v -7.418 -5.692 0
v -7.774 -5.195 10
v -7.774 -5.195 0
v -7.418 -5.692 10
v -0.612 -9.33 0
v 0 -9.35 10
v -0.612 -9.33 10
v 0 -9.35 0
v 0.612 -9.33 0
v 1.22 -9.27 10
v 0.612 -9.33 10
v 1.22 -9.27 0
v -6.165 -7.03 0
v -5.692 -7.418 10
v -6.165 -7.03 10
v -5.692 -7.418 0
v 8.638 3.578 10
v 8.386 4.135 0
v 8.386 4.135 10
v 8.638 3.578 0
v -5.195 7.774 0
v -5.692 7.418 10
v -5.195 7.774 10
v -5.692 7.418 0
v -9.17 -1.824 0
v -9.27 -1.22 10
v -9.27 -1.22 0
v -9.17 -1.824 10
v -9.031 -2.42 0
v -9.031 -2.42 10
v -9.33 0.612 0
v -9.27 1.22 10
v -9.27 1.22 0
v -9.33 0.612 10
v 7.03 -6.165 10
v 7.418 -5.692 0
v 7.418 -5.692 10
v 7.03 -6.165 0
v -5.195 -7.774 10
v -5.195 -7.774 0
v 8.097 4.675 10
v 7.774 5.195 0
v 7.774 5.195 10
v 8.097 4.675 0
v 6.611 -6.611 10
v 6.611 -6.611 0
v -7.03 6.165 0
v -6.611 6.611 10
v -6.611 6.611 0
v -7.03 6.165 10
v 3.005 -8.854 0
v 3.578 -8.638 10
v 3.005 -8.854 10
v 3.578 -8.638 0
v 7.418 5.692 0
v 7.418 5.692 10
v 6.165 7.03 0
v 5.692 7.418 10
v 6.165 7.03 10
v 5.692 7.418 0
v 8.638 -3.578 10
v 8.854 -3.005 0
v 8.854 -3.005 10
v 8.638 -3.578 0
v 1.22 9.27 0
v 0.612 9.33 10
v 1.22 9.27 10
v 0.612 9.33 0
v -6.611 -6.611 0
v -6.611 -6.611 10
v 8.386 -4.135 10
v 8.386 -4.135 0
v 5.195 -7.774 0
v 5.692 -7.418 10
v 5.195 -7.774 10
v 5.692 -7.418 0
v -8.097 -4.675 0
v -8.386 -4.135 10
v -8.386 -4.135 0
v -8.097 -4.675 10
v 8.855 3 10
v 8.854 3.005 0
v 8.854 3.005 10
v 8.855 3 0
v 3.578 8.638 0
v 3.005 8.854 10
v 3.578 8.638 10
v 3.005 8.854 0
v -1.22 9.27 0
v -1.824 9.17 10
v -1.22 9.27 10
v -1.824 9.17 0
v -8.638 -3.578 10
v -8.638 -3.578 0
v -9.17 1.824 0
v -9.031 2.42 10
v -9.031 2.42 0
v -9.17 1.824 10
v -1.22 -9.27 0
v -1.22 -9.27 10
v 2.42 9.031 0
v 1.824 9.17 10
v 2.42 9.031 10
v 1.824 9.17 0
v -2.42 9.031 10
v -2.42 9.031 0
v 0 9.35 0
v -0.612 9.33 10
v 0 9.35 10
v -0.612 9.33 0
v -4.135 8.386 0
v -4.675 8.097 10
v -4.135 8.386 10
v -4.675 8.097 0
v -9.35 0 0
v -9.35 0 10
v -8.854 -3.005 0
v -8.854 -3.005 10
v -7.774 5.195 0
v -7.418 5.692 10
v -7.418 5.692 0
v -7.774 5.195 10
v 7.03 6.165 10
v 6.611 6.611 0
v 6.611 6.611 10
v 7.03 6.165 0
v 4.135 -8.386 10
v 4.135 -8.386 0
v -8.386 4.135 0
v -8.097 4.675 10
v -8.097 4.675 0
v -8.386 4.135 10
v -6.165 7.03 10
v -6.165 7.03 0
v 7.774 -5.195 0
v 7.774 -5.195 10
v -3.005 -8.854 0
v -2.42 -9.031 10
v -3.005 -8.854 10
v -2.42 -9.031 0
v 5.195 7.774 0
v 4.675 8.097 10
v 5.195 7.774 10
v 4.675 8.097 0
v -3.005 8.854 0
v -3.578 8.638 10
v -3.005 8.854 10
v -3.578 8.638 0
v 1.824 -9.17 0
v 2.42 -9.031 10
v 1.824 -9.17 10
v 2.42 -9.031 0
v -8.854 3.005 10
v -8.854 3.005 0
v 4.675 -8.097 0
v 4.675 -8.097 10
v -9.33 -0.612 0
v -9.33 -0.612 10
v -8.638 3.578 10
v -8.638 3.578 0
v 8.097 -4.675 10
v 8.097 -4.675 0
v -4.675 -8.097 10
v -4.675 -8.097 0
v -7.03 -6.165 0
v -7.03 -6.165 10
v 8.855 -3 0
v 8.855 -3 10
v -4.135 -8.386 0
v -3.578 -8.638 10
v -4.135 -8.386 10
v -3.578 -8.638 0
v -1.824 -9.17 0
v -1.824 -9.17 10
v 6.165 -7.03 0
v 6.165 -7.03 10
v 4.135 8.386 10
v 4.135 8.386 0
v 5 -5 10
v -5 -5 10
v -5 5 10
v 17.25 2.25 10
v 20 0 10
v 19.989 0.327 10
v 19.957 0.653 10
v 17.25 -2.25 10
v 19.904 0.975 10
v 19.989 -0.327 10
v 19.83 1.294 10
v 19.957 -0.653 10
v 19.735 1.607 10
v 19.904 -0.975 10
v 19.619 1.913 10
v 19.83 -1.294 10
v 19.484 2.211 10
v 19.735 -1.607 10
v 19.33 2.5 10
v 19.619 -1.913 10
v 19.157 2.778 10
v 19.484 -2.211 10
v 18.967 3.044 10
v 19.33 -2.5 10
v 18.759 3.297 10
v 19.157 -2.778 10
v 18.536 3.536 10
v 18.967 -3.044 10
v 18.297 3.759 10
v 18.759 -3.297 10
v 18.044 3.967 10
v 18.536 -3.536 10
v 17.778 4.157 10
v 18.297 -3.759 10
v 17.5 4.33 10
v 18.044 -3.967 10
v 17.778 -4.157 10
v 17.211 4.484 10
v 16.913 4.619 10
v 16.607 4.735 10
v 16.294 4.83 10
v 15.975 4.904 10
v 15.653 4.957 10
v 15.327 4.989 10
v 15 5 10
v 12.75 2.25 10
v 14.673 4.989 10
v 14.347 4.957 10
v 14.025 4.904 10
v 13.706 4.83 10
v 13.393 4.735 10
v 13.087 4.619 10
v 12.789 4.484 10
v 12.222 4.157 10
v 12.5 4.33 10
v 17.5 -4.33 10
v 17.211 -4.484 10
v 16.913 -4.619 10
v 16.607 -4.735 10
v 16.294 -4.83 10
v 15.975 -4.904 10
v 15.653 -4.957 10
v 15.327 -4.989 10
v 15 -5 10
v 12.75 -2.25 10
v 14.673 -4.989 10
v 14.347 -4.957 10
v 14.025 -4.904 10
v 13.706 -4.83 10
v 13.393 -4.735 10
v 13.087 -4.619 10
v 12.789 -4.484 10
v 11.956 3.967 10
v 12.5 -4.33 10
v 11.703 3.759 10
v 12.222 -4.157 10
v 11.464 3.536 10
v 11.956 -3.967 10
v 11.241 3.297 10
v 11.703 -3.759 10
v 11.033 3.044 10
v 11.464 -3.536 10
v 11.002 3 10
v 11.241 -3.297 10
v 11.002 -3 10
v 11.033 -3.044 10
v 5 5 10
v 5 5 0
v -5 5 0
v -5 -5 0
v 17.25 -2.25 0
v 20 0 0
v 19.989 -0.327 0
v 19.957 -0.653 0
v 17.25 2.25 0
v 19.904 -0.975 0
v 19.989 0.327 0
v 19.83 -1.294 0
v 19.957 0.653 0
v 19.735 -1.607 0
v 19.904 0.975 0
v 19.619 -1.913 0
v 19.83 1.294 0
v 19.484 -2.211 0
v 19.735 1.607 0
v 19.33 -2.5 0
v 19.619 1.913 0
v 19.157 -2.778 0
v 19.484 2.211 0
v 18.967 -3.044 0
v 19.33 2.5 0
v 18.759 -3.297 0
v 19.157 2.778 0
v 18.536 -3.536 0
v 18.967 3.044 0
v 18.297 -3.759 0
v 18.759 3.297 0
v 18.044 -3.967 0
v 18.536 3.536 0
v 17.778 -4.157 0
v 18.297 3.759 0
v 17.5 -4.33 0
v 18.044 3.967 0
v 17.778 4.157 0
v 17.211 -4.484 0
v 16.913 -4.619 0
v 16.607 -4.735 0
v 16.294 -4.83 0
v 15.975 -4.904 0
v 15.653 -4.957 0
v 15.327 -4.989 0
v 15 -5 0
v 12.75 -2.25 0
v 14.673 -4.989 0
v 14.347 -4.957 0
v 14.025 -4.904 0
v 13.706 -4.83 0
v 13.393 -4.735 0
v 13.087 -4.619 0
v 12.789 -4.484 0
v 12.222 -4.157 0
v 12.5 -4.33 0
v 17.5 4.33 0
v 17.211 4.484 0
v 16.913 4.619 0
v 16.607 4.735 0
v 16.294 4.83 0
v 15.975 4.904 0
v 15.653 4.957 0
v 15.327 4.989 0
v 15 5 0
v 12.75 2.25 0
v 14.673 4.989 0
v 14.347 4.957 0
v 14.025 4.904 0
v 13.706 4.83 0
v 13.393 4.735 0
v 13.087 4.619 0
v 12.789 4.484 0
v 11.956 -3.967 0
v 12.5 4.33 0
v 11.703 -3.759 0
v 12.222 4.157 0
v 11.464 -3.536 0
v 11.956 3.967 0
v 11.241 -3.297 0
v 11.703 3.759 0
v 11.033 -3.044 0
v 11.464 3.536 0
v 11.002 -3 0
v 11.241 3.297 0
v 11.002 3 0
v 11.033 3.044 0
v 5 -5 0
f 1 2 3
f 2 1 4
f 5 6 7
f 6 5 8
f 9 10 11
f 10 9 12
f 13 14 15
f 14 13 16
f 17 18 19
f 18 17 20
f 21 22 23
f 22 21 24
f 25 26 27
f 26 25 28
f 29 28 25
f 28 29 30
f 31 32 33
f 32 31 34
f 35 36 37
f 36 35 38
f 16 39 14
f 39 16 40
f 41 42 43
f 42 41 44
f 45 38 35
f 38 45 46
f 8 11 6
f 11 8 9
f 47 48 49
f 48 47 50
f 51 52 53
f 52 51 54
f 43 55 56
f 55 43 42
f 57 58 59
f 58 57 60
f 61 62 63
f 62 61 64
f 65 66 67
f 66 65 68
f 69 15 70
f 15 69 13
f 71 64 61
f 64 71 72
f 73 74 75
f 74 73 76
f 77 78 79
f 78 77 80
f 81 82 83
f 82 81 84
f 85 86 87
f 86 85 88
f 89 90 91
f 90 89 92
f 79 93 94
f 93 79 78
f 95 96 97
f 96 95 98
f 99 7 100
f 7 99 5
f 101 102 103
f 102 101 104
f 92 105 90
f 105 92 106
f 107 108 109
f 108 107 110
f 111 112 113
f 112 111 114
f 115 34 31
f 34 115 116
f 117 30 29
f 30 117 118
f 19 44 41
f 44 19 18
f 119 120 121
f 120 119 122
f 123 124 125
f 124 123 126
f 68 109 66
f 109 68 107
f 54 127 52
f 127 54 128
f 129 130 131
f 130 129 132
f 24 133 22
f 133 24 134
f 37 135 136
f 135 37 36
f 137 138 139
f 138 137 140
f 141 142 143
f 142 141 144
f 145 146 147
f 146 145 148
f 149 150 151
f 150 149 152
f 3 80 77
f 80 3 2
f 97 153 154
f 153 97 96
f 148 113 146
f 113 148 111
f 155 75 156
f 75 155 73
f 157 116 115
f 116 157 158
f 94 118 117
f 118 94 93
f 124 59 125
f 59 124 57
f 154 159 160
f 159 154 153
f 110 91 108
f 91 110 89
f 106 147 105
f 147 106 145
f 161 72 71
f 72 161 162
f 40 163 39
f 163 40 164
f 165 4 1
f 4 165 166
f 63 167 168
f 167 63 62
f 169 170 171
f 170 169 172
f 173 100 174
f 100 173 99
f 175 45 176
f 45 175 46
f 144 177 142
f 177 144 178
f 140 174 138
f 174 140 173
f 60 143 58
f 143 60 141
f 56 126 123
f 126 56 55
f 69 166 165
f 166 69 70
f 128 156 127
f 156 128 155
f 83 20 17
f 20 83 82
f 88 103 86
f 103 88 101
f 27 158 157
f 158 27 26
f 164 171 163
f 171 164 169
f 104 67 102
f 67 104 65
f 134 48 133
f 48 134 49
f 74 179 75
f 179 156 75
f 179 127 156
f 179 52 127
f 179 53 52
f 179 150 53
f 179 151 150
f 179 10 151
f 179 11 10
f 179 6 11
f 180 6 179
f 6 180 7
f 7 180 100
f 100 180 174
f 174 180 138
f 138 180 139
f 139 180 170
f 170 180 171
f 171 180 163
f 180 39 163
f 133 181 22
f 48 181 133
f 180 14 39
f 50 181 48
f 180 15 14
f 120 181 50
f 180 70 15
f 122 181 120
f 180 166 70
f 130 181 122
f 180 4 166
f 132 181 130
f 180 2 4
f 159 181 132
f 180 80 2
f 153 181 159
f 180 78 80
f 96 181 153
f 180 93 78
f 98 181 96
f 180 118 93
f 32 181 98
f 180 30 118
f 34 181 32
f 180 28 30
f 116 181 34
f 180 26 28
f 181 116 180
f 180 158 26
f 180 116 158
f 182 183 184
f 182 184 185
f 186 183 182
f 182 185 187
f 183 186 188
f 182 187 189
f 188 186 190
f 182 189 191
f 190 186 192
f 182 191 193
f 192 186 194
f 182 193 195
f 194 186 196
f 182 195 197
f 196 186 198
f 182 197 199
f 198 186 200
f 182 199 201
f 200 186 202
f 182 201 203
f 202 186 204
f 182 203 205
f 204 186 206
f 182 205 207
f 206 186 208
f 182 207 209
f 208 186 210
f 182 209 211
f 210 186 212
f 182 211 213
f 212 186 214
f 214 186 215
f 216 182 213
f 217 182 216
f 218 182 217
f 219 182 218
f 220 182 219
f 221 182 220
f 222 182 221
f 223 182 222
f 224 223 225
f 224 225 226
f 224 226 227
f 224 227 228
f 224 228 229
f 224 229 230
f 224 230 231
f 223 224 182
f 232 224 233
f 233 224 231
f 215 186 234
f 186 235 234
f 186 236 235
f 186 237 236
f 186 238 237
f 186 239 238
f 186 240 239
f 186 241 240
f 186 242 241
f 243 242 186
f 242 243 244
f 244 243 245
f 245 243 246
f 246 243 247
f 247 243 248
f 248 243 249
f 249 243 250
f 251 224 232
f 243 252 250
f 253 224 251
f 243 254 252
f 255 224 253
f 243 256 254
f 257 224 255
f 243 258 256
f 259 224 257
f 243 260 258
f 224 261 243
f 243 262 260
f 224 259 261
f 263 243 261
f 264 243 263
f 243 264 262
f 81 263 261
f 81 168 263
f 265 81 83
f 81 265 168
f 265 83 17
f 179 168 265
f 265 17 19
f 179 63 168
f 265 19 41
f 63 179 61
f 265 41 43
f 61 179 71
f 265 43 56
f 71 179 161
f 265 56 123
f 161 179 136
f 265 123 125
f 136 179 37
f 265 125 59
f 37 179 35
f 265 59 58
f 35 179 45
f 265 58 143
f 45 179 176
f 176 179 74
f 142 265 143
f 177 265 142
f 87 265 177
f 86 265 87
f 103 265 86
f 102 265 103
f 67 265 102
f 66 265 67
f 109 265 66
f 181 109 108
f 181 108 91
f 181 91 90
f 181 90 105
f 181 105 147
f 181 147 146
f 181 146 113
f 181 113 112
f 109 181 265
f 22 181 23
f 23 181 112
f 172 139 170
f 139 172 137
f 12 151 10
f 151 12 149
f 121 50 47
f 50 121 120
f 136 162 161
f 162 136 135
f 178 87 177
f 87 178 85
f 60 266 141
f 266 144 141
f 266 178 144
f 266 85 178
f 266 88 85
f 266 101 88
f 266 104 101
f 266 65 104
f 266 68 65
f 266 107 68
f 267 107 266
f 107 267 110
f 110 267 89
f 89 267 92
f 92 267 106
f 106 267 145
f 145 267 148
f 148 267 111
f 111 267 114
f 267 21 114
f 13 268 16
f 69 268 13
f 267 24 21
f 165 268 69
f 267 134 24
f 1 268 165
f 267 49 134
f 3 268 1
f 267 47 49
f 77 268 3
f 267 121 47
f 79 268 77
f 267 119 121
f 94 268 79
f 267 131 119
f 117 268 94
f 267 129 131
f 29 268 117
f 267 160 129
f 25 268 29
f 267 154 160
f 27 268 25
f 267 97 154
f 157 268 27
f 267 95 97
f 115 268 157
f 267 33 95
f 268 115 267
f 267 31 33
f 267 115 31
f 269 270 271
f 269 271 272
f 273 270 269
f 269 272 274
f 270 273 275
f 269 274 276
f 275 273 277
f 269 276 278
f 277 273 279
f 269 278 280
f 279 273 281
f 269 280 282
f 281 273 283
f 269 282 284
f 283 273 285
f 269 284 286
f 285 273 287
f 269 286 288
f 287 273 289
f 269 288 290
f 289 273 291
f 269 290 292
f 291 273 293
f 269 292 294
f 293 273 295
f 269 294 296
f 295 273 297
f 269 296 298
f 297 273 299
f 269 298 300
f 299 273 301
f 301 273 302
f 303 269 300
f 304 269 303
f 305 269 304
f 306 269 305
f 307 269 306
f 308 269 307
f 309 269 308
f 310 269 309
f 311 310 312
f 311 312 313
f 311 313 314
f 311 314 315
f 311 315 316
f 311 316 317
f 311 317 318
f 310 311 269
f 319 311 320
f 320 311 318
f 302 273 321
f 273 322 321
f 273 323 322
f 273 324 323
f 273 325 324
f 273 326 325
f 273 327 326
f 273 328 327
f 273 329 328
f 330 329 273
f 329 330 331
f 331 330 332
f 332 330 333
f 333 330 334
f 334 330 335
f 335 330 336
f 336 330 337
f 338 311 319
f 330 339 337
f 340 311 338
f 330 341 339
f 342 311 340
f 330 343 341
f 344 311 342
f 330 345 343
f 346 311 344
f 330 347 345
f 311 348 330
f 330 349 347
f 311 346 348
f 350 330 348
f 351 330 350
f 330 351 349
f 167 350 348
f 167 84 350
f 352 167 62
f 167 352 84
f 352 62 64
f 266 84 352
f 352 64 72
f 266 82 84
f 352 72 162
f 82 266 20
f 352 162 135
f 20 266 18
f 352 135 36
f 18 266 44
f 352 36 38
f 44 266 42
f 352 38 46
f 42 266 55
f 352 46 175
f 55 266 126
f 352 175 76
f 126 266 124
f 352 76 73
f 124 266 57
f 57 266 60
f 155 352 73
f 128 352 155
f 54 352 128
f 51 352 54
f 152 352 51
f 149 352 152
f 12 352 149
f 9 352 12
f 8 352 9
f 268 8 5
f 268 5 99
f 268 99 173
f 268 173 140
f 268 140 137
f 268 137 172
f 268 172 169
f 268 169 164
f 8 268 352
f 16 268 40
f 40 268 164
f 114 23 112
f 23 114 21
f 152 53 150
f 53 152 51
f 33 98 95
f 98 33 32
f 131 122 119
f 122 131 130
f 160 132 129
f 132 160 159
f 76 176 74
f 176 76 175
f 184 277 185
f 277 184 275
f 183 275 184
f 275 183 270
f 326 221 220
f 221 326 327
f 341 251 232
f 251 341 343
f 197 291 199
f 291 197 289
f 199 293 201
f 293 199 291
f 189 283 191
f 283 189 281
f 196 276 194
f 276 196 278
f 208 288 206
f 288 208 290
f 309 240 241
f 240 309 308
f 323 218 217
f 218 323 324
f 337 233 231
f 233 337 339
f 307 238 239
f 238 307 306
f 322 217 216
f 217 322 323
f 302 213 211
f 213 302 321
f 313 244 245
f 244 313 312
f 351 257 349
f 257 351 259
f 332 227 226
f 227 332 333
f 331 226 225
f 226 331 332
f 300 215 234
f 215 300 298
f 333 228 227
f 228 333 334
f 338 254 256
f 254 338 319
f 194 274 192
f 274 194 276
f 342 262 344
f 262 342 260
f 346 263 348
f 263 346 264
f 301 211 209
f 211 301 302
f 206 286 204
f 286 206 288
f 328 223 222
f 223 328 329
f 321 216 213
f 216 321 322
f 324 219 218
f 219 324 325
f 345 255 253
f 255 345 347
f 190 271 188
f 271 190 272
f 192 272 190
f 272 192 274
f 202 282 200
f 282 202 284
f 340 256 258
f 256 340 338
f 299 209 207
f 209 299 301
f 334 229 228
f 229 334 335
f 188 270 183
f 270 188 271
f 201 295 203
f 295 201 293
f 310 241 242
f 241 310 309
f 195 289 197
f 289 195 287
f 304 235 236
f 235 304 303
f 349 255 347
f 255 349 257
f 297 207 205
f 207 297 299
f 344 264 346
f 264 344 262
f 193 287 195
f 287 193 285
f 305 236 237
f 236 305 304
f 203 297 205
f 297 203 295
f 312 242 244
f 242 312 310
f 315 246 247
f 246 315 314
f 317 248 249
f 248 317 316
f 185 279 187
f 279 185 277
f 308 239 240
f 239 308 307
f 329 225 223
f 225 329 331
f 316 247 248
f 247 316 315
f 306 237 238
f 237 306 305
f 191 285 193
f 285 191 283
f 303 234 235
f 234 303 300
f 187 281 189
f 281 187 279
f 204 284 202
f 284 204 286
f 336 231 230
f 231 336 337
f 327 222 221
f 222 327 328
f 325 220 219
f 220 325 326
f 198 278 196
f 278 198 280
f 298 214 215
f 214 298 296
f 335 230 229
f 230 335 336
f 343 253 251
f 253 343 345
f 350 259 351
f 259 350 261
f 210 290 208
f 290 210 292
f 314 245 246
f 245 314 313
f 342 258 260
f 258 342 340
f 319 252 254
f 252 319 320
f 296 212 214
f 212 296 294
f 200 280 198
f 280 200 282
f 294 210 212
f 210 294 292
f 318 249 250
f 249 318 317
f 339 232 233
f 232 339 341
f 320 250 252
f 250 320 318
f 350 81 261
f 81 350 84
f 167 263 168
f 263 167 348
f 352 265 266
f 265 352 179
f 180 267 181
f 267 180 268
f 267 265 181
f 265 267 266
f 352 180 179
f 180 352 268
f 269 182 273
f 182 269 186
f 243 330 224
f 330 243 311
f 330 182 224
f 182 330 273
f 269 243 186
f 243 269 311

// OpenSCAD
// Snap-on tubing clip for 12.7 mm lab stand rod
// Print orientation: flat on bed, extruded in +Z

// ---- Stand rod ring ----
stand_d      = 12.7;   // stand rod diameter
stand_wall   = 3;      // ring wall thickness
stand_od     = stand_d + 2 * stand_wall; // 18.7 mm outer diameter
stand_open   = 10;     // opening width on -X side

// ---- Tubing ring ----
tube_d       = 6;      // tubing inner diameter
tube_wall    = 2;      // ring wall thickness
tube_od      = tube_d + 2 * tube_wall;   // 10 mm outer diameter
tube_x       = 15;     // ring centre X
tube_open    = 4.5;    // opening width on +X side

// ---- Bridge ----
bridge_w     = 6;      // bridge width in Y
bridge_x0    = 8;      // bridge start X
bridge_x1    = 12;     // bridge end X

// ---- Misc ----
eps          = 0.5;    // cutter overshoot
$fn          = 96;

difference() {
    union() {
        // Stand rod ring
        translate([0, 0, 0])
            cylinder(d = stand_od, h = 10);
        // Tubing ring
        translate([tube_x, 0, 0])
            cylinder(d = tube_od, h = 10);
        // Bridge
        translate([bridge_x0, -bridge_w / 2, 0])
            cube([bridge_x1 - bridge_x0, bridge_w, 10]);
    }
    // Stand rod opening
    translate([-stand_open / 2, -stand_open / 2, -eps])
        cube([stand_open, stand_open, 10 + 2 * eps]);
    // Tubing opening
    translate([tube_x - tube_open / 2, -tube_open / 2, -eps])
        cube([tube_open, tube_open, 10 + 2 * eps]);
}
